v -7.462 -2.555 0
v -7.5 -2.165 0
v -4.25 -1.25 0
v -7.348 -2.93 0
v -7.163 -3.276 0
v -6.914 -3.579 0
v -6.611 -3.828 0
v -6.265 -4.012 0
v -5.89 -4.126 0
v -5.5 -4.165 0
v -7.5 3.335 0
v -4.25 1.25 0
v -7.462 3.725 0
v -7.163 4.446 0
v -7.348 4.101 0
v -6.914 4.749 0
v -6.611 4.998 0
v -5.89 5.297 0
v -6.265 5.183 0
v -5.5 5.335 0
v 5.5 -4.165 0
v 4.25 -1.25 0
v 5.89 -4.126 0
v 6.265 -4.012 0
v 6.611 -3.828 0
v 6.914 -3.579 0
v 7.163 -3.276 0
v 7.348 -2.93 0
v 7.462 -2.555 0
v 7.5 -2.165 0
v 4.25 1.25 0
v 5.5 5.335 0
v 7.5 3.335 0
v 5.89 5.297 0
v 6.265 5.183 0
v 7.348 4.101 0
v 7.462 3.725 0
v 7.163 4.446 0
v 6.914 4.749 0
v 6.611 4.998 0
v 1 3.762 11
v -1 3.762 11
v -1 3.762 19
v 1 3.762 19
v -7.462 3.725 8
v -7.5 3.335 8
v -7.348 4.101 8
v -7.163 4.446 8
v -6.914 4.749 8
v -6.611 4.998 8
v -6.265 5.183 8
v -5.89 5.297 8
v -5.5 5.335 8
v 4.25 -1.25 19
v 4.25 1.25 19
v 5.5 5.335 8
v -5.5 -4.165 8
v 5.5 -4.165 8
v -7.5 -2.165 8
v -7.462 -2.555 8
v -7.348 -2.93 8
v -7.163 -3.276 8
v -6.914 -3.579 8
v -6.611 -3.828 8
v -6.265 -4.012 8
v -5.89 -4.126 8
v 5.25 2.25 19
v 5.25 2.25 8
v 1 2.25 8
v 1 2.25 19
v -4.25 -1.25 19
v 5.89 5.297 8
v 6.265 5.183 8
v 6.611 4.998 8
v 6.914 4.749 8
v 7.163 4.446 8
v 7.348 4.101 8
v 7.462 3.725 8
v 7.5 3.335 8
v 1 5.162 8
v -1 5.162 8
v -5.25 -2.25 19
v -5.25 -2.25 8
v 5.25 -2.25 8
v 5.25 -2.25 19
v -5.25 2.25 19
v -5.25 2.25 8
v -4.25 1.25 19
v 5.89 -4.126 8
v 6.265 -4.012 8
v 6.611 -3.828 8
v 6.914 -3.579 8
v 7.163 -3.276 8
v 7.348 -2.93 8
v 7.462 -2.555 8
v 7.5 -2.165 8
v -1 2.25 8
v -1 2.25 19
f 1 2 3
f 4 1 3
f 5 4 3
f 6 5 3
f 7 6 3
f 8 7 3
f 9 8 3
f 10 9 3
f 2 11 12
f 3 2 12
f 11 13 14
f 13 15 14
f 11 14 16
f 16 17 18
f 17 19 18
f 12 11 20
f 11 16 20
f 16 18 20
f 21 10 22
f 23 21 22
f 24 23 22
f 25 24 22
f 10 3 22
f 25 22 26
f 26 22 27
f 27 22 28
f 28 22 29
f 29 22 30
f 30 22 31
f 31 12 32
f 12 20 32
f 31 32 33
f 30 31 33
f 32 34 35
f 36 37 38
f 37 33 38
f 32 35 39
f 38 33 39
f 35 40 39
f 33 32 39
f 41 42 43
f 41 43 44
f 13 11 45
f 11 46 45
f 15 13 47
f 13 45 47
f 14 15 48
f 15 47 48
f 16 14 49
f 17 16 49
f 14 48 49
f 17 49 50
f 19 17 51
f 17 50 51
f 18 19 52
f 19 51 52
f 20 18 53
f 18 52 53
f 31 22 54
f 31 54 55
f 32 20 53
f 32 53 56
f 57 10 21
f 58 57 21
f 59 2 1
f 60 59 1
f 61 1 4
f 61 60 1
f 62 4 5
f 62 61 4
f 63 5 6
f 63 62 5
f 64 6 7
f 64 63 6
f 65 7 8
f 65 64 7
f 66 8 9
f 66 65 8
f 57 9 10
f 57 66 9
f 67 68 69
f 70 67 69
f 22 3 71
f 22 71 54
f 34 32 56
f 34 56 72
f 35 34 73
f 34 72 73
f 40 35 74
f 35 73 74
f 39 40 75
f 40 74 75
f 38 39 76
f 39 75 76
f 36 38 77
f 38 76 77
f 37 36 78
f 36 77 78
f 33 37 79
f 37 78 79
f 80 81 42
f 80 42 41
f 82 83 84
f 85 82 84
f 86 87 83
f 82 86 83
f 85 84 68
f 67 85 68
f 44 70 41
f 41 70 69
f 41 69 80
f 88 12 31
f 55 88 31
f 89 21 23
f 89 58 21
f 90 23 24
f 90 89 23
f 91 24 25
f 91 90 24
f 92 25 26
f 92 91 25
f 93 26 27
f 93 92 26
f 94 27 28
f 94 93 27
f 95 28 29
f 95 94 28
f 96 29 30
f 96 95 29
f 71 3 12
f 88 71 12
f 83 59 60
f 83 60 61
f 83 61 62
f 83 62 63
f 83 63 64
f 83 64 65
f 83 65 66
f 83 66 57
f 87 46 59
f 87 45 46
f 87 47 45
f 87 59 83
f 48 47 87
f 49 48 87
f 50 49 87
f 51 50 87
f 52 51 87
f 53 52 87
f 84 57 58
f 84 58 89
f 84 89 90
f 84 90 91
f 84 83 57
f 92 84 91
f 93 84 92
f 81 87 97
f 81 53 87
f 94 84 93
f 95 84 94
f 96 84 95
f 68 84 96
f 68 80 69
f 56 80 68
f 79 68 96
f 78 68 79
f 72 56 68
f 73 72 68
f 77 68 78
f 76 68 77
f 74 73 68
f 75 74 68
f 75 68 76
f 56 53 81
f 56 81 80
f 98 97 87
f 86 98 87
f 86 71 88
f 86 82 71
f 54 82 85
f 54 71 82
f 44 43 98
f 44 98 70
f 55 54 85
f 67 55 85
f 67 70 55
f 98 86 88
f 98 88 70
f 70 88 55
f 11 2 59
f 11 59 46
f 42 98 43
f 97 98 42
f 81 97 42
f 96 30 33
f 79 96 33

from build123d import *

# Parameters (mm, degrees)
F0_W     = 8.5
F0_H     = 2.5
F0_W_2   = 2
F0_H_2   = 1.512365222
F1_DEPTH = 19
F0_W_3   = 15
F0_H_3   = 9.5
F2_DEPTH = 8
F3_R     = 2
F4_SIZE2 = 1.4
F4_SIZE  = 3


with BuildPart() as f1:
    # F0 (on Top) → F1 (new body)
    with BuildSketch(Plane.XY):
        Polygon((-5.25, -2.25), (5.25, -2.25), (5.25, 2.25), (1, 2.25), (-1, 2.25), (-5.25, 2.25), align=None)
        Rectangle(F0_W, F0_H, mode=Mode.SUBTRACT)
        with Locations((0, 3.006182611)):
            Rectangle(F0_W_2, F0_H_2)
    extrude(amount=F1_DEPTH)

    # F0 (on Top) → F2 (join)
    with BuildSketch(Plane.XY):
        with Locations((0, 0.5852708127)):
            Rectangle(F0_W_3, F0_H_3)
        Polygon((5.25, 2.25), (5.25, -2.25), (-5.25, -2.25), (-5.25, 2.25), (-1, 2.25), (-1, 3.762365222), (1, 3.762365222), (1, 2.25), align=None, mode=Mode.SUBTRACT)
    extrude(amount=F2_DEPTH)

    # F3
    f3_edges = [f1.edges().sort_by_distance(p)[0] for p in [
        (-7.5, -4.164729, 4),
        (7.5, -4.164729, 4),
        (7.5, 5.335271, 4),
        (-7.5, 5.335271, 4),
    ]]
    fillet(f3_edges, radius=F3_R)

    # F4
    f4_edges = [f1.edges().sort_by_distance(p)[0] for p in [
        (0, 3.762365, 8),
    ]]
    f4_side = f1.faces().sort_by_distance((0, 3.762365, 13.5))[0]
    chamfer(f4_edges, length=F4_SIZE, length2=F4_SIZE2, reference=f4_side)


solid = f1.part
